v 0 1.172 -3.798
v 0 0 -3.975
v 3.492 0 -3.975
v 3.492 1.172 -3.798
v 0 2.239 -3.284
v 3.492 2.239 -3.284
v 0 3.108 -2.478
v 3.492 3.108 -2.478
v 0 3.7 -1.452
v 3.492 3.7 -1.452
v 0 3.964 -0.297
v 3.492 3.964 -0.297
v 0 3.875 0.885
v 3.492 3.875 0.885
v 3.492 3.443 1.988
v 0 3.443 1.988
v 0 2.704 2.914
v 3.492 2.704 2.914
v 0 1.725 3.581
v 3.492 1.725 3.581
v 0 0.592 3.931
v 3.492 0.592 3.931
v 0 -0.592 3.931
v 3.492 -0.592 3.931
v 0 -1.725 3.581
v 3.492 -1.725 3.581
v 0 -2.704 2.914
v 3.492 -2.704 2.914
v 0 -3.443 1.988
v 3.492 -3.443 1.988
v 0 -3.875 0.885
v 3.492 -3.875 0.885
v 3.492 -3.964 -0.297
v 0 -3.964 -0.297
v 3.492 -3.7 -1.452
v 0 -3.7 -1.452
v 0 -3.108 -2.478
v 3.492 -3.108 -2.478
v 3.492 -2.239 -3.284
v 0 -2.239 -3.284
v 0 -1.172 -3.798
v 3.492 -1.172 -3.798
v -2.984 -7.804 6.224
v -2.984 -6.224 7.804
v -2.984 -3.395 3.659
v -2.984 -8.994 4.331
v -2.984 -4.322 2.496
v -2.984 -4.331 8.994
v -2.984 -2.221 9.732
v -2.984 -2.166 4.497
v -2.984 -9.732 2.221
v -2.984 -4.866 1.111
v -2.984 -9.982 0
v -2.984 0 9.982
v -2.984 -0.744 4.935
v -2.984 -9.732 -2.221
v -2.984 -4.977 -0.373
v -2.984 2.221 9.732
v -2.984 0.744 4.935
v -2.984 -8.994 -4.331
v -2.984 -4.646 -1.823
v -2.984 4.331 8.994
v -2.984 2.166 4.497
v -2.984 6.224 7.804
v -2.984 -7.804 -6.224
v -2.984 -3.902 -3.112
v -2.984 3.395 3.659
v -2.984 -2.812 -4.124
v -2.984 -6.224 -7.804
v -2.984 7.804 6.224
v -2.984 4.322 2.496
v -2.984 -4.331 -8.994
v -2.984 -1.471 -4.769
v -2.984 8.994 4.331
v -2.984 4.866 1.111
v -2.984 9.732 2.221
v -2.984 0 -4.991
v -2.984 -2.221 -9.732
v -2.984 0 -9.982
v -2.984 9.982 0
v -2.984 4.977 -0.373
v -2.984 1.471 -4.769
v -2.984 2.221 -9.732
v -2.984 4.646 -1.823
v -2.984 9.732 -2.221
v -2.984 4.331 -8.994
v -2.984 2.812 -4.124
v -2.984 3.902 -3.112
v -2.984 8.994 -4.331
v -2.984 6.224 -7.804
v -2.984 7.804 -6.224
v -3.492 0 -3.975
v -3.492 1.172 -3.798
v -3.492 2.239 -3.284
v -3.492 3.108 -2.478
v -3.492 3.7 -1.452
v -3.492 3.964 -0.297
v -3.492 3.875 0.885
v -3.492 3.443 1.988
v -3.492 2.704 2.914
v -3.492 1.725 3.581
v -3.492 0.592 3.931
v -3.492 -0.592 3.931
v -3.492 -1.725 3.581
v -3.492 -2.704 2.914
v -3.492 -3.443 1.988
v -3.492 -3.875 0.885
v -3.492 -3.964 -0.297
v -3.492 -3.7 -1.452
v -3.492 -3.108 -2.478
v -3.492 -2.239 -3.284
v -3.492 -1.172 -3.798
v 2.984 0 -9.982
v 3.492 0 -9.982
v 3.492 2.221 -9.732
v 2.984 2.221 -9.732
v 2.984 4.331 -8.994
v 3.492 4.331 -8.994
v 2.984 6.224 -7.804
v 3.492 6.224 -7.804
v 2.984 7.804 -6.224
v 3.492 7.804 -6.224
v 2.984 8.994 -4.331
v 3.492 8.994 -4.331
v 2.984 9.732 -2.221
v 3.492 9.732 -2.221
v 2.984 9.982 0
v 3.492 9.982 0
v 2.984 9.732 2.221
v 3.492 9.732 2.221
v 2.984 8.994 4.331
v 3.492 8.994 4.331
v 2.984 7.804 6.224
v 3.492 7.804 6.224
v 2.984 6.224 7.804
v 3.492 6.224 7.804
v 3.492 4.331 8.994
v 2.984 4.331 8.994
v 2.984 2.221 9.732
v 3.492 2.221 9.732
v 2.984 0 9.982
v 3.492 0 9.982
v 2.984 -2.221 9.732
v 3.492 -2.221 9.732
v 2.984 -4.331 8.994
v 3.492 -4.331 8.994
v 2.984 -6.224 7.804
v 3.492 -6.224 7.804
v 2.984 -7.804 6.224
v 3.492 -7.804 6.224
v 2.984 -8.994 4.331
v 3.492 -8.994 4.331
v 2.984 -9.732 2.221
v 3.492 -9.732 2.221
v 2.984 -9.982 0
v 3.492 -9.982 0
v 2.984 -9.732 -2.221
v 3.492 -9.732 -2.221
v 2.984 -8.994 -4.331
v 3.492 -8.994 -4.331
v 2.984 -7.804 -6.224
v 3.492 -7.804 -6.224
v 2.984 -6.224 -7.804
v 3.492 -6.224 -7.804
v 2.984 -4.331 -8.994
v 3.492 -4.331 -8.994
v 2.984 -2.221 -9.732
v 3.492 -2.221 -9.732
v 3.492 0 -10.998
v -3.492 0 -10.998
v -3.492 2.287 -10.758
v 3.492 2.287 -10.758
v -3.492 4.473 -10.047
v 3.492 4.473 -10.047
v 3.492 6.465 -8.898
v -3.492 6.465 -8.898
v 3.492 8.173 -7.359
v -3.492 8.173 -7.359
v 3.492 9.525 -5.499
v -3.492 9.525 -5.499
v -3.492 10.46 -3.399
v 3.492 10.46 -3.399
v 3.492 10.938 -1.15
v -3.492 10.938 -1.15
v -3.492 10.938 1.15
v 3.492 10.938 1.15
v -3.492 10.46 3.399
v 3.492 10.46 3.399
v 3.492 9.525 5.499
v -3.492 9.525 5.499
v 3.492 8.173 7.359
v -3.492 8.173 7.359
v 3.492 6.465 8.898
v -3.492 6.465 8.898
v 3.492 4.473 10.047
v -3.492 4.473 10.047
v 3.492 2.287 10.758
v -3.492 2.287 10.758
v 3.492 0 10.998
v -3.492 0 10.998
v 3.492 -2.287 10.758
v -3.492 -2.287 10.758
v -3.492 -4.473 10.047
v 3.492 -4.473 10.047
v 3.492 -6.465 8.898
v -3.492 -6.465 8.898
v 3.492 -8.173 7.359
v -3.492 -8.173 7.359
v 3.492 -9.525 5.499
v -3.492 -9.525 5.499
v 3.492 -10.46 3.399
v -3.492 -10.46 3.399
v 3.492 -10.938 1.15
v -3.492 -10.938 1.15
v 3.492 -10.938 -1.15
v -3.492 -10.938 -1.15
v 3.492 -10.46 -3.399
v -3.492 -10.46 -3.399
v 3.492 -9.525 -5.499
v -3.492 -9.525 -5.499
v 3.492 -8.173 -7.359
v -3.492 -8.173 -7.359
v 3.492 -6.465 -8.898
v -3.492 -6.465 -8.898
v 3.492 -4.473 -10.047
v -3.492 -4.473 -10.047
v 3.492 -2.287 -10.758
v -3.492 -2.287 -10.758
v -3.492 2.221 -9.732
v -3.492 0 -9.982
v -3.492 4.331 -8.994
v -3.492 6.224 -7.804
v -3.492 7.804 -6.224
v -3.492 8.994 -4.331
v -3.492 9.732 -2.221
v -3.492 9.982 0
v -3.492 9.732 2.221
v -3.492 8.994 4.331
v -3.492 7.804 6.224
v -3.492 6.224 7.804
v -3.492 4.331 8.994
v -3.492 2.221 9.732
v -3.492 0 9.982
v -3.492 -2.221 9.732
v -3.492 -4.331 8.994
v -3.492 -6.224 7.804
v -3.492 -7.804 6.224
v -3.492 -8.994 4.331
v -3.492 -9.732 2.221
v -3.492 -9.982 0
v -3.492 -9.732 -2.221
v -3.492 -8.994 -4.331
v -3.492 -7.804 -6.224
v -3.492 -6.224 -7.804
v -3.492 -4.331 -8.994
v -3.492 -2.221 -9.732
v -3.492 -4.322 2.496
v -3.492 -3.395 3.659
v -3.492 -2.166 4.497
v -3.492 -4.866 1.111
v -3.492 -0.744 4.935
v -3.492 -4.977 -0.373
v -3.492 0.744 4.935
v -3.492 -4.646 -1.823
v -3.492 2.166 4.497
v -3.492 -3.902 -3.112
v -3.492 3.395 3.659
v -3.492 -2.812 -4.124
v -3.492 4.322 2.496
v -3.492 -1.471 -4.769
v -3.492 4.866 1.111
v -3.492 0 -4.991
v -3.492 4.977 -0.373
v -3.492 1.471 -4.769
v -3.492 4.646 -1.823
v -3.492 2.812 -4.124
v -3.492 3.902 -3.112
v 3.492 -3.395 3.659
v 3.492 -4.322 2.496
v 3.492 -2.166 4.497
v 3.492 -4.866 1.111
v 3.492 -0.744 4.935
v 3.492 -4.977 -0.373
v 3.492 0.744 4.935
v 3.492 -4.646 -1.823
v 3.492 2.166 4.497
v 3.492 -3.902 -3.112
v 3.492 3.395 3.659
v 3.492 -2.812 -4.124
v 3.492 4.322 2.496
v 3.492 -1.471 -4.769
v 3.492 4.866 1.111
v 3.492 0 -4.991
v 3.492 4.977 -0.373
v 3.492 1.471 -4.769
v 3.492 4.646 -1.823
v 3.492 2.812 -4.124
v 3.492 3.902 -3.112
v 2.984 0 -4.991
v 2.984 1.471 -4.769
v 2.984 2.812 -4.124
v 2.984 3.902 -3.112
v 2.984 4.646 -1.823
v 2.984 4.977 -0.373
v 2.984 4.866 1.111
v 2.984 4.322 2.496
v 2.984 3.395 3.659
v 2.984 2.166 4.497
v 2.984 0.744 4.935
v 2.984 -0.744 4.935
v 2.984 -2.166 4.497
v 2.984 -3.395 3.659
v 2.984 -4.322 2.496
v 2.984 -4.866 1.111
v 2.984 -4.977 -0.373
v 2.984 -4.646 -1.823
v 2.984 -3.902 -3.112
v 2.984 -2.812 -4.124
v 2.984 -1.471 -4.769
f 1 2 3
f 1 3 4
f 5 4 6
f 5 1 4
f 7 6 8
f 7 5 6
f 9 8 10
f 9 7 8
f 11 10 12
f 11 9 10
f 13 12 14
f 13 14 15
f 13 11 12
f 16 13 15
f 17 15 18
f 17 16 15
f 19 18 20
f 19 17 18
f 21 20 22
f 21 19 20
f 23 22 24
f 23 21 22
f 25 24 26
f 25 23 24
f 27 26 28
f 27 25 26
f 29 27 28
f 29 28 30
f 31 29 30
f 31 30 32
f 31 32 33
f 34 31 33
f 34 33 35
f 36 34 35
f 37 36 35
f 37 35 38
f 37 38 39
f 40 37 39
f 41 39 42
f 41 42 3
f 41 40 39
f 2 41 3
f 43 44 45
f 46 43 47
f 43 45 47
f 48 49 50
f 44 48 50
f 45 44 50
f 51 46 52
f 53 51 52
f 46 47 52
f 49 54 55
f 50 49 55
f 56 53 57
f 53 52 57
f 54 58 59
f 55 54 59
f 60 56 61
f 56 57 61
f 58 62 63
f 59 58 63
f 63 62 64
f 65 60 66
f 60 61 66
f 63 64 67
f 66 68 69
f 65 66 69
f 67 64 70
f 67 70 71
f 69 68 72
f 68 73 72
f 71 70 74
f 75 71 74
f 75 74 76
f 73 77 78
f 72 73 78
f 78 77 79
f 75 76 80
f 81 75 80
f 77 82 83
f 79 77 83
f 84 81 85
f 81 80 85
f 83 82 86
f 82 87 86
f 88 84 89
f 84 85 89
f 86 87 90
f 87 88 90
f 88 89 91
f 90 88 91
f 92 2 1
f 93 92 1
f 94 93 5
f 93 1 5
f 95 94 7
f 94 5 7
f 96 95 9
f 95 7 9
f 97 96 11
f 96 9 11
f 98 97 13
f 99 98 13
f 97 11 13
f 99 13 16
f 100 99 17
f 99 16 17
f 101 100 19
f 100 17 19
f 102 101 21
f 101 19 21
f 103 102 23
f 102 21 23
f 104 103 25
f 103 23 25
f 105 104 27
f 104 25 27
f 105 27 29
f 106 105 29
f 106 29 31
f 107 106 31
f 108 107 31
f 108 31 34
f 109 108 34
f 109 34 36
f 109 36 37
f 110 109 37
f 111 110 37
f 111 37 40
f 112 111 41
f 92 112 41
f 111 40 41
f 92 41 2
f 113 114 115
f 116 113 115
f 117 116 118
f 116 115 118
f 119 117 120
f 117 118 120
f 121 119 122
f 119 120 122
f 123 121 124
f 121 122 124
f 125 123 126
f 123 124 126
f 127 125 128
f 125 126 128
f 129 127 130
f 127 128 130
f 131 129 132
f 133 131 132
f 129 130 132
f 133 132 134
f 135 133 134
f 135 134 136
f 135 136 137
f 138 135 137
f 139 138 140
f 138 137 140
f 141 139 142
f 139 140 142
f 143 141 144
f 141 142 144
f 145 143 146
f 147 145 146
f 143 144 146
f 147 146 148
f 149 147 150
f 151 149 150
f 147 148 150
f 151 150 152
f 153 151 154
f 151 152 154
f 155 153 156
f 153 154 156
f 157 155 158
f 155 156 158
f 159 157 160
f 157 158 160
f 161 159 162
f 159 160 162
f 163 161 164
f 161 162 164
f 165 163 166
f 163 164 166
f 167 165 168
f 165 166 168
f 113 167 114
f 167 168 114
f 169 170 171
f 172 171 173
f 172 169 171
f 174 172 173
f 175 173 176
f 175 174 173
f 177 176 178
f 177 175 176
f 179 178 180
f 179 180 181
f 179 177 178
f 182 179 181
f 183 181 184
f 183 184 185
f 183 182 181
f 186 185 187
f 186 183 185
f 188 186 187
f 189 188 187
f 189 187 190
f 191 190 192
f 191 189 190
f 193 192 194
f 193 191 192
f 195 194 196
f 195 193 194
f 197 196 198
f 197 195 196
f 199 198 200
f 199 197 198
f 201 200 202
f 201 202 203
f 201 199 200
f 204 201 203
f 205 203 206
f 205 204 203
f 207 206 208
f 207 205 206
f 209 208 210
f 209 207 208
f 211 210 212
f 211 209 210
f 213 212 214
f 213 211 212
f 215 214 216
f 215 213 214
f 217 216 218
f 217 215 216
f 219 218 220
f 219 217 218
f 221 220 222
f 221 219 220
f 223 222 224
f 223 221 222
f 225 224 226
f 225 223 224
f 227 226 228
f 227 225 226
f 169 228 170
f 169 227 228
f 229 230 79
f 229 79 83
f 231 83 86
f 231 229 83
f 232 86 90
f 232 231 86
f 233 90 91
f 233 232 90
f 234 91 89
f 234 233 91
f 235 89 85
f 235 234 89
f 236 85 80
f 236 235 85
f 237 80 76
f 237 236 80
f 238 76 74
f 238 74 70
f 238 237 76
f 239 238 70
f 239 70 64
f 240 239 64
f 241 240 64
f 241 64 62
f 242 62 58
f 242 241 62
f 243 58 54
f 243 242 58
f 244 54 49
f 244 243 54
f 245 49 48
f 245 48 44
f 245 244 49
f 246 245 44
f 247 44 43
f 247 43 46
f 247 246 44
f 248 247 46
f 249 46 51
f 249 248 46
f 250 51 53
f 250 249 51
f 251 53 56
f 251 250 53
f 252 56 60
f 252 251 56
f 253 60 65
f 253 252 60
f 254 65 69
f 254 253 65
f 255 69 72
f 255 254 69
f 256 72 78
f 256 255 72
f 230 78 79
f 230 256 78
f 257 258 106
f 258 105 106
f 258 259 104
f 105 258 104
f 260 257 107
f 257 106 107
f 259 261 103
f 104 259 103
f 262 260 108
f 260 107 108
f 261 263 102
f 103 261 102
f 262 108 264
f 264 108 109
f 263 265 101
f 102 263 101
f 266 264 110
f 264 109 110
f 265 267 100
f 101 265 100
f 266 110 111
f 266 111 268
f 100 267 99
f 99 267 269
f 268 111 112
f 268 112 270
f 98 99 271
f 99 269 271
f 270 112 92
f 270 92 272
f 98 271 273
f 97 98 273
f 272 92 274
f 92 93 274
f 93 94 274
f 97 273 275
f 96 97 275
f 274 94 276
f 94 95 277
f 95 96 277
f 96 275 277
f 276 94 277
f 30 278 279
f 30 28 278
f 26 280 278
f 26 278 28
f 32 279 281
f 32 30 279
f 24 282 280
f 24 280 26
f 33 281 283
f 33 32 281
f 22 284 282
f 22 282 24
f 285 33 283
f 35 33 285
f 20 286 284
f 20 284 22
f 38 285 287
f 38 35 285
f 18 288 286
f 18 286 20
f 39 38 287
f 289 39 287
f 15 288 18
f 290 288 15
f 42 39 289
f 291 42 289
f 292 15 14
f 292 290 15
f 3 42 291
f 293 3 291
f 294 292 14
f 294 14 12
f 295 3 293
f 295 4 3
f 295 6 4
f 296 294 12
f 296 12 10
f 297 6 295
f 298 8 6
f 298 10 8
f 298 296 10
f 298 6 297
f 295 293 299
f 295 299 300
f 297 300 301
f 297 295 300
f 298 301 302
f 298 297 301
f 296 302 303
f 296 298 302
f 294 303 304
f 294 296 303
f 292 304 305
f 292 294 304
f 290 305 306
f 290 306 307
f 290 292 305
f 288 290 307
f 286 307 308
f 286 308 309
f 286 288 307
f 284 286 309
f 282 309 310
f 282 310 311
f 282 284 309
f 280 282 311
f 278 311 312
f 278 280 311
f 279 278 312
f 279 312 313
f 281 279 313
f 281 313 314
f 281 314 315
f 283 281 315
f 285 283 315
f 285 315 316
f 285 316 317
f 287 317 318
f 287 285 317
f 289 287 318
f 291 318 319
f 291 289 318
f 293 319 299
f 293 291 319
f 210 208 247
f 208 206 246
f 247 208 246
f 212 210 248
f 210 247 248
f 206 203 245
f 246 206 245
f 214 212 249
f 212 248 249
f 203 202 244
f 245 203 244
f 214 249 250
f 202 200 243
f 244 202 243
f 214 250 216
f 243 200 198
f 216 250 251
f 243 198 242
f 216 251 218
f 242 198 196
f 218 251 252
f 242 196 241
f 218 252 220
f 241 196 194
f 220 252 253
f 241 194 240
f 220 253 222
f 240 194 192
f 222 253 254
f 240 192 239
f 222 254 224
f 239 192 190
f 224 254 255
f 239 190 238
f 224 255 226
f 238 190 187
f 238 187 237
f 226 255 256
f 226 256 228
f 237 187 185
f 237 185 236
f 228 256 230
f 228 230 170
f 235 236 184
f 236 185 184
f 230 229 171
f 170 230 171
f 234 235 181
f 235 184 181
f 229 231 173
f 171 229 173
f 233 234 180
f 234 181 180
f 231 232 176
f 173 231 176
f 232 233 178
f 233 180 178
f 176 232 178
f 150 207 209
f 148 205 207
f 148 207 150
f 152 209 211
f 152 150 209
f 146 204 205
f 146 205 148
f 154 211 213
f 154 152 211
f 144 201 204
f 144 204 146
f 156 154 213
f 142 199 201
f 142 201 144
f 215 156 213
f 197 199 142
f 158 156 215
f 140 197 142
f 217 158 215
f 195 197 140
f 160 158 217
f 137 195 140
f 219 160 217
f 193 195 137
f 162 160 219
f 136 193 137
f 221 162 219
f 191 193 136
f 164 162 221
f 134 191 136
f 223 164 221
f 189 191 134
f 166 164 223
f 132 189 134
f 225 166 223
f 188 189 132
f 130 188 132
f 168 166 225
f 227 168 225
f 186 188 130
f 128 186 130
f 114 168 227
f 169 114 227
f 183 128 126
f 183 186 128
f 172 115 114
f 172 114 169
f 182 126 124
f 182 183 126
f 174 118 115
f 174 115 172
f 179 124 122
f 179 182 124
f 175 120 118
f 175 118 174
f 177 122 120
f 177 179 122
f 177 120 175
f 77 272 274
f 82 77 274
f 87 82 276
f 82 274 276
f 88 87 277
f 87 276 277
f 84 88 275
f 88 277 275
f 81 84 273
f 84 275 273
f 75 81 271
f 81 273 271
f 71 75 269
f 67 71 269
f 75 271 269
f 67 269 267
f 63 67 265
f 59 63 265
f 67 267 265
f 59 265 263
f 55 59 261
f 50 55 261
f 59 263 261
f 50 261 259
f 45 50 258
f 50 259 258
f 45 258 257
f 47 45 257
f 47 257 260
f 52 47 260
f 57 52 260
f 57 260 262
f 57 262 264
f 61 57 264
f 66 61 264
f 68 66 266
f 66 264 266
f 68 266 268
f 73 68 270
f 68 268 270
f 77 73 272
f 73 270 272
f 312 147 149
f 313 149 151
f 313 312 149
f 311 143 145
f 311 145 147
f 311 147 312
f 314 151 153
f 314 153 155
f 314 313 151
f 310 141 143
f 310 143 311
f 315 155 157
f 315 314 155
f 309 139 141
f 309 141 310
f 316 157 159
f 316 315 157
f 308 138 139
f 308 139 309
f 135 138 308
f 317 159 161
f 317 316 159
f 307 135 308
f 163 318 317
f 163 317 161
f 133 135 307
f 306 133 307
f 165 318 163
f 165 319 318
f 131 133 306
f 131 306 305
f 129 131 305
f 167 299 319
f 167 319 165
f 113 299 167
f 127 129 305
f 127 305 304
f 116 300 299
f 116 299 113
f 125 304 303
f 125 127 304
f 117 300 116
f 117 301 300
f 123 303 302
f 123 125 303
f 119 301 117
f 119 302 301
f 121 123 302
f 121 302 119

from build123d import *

# Parameters (mm, degrees)
SKETCH1_R      = 10.9982
SKETCH1_R_2    = 3.9751
EXTRUDE1_DEPTH = 3.4925
SKETCH2_R      = 9.9822
SKETCH2_R_2    = 4.9911
EXTRUDE2_DEPTH = 0.508


with BuildPart() as part:
    # Sketch1 → Extrude1 (new body)
    with BuildSketch(Plane(origin=(0, 0, 0), x_dir=(0, 0, -1), z_dir=(1, 0, 0))):
        Circle(SKETCH1_R)
        Circle(SKETCH1_R_2, mode=Mode.SUBTRACT)
    extrude1 = extrude(amount=EXTRUDE1_DEPTH)

    # Sketch2 → Extrude2 (cut)
    with BuildSketch(Plane(origin=(3.4925, 0, 0), x_dir=(0, 0, -1), z_dir=(1, 0, 0))):
        Circle(SKETCH2_R)
        Circle(SKETCH2_R_2, mode=Mode.SUBTRACT)
    extrude2 = extrude(amount=-EXTRUDE2_DEPTH, mode=Mode.SUBTRACT)

    # Mirror1: Extrude1, Extrude2 across plane
    add(extrude1.mirror(Plane(origin=(0, 0, 0), x_dir=(0, 0, 1), z_dir=(1, 0, 0))))
    add(extrude2.mirror(Plane(origin=(0, 0, 0), x_dir=(0, 0, 1), z_dir=(1, 0, 0))), mode=Mode.SUBTRACT)


solid = part.part
